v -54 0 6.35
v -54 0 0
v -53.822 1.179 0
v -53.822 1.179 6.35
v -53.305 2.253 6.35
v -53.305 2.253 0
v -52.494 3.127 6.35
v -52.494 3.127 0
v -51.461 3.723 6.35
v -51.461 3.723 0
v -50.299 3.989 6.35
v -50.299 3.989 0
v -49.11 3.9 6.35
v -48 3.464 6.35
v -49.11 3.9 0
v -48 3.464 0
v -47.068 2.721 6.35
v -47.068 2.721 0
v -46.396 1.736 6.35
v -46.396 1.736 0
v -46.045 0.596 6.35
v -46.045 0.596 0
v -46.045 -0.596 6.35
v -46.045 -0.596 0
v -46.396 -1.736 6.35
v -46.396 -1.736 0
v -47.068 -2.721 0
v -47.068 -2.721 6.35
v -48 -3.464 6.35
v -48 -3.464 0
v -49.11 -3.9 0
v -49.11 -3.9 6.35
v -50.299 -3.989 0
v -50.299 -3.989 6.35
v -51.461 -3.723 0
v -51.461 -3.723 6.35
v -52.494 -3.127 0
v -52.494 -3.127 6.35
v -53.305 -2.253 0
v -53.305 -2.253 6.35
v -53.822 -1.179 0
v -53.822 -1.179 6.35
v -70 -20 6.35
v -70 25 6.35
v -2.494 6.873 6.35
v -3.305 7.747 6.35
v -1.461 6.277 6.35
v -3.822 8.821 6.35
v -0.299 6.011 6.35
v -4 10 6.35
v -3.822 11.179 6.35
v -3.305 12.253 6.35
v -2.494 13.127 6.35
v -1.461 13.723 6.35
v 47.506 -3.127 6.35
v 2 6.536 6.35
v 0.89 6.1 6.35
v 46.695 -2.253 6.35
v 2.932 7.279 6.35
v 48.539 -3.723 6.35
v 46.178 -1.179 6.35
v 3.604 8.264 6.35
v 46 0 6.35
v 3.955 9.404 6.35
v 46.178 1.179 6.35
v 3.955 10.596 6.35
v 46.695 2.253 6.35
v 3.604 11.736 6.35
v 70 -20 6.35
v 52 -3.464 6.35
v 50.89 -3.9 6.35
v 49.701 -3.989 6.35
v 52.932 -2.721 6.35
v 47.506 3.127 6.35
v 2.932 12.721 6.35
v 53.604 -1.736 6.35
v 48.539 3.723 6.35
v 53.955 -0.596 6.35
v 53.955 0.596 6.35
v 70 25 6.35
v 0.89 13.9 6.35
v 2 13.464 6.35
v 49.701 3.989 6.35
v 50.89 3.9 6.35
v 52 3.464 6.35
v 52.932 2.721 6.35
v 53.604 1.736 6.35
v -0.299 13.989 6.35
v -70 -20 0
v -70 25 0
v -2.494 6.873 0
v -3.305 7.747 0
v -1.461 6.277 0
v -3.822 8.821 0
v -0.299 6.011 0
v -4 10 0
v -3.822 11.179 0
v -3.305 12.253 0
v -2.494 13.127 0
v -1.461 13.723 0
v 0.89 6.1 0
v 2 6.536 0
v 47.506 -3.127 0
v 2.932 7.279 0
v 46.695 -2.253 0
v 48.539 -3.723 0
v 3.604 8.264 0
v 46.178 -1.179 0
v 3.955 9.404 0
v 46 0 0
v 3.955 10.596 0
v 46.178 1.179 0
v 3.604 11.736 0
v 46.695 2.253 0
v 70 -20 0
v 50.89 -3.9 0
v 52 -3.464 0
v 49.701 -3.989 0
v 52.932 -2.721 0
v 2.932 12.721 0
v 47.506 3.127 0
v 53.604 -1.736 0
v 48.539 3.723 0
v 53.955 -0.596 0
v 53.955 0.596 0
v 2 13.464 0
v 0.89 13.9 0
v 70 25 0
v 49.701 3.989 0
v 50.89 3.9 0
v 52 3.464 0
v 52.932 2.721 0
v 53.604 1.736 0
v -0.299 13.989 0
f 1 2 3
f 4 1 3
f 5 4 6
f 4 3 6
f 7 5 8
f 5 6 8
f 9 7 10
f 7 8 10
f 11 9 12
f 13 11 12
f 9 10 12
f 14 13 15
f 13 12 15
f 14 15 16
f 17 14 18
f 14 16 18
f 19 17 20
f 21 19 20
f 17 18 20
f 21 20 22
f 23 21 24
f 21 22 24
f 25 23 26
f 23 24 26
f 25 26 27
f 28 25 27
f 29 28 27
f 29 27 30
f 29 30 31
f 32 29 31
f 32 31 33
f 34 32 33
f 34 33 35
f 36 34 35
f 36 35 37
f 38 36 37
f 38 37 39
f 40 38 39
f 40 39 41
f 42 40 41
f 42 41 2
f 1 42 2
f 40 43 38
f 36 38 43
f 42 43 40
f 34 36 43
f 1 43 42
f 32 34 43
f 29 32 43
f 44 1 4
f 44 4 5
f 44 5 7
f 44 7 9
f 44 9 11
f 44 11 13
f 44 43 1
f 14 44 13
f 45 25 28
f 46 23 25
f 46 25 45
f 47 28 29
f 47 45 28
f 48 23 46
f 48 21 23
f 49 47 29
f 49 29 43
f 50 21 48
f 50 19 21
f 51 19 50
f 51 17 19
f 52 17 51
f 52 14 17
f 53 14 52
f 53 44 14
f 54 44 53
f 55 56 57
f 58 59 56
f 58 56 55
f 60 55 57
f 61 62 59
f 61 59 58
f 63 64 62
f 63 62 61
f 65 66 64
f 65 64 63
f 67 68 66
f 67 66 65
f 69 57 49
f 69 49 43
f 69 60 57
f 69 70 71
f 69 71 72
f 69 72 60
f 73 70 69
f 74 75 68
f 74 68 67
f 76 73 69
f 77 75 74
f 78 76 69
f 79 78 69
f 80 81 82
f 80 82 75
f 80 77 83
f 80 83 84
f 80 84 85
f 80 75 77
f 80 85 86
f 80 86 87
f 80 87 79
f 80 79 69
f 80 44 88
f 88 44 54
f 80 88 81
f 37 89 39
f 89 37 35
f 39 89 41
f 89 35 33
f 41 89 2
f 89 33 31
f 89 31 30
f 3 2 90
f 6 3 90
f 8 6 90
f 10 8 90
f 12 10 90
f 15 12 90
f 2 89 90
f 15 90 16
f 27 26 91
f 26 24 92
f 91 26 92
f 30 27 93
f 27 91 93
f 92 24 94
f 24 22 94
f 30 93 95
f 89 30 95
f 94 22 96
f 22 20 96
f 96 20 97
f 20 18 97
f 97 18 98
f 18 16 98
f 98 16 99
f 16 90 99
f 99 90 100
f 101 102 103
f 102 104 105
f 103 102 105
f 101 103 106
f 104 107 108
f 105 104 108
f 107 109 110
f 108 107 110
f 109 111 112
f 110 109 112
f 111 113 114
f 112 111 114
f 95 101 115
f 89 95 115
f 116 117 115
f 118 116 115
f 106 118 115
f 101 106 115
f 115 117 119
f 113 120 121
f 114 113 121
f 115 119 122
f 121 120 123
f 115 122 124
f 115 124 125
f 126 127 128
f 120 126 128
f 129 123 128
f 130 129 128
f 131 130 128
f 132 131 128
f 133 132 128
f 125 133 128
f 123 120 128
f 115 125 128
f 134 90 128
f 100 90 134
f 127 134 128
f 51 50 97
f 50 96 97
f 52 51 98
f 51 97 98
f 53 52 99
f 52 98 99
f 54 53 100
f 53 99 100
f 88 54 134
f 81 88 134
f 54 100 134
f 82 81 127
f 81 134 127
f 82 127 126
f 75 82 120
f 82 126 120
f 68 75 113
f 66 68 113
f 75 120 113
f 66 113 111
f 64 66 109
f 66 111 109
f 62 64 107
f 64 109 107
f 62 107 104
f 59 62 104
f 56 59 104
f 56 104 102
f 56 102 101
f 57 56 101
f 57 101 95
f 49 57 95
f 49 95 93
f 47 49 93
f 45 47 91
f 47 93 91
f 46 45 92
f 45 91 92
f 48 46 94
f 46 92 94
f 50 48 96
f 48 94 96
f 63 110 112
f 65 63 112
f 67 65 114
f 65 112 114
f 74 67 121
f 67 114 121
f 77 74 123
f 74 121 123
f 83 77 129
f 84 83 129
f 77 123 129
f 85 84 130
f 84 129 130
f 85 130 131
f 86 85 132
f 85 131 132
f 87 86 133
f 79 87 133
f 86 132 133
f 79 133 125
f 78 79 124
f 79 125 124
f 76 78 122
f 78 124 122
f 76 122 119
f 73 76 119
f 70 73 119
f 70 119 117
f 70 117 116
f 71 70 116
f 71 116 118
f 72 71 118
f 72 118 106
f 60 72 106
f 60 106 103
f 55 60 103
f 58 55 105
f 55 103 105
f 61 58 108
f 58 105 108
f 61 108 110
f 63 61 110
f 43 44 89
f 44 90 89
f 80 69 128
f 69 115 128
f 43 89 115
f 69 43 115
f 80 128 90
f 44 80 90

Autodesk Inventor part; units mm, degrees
ref_plane "YZ Plane" through (0, 0, 0) normal (1, 0, 0) x (0, 1, 0)
ref_plane "XZ Plane" through (0, 0, 0) normal (0, 1, 0) x (-1, 0, 0)
ref_plane "XY Plane" through (0, 0, 0) normal (0, 0, 1) x (1, 0, 0)
sketch "Sketch1" plane through (0, 0, 0) normal (0, 0, 1) x (1, 0, 0)
  line L0 (-70, -20) -> (70, -20)
  line L1 (70, -20) -> (70, 20)
  line L2 (70, 20) -> (-70, 20)
  line L3 (-70, 20) -> (-70, -20)
  line L4 (-70, -20) -> (70, 20) construction
  line L5 (70, -20) -> (-70, 20) construction
  point P0 (0, 0)
  dimension "d0" = 140
  dimension "d1" = 40
extrude "Extrusion1" add sketch "Sketch1" along normal blind 6.35
sketch "Sketch2" plane through (0, 0, 0) normal (0, 0, -1) x (-1, 0, 0)
  circle A0 centre (-50, 0) radius 4
  circle A1 centre (0, 10) radius 4
  circle A2 centre (50, 0) radius 4
  line L0 (-70, -20) -> (-70, 20) projected
  point P0 (0, 0)
  point P1 (-70, 0)
  dimension "d4" = 20
  dimension "d5" = 100
  dimension "d6" = 50
  dimension "d7" = 8
  dimension "d8" = 10
extrude "Extrusion2" cut sketch "Sketch2" against normal through all
thicken "Thicken1" operation add thickness 5 both sides no extend neighbours yes toward (0, 1, 0) faces at (23.3333, 20, 2.1167)
properties part number "Zapata_freno"
